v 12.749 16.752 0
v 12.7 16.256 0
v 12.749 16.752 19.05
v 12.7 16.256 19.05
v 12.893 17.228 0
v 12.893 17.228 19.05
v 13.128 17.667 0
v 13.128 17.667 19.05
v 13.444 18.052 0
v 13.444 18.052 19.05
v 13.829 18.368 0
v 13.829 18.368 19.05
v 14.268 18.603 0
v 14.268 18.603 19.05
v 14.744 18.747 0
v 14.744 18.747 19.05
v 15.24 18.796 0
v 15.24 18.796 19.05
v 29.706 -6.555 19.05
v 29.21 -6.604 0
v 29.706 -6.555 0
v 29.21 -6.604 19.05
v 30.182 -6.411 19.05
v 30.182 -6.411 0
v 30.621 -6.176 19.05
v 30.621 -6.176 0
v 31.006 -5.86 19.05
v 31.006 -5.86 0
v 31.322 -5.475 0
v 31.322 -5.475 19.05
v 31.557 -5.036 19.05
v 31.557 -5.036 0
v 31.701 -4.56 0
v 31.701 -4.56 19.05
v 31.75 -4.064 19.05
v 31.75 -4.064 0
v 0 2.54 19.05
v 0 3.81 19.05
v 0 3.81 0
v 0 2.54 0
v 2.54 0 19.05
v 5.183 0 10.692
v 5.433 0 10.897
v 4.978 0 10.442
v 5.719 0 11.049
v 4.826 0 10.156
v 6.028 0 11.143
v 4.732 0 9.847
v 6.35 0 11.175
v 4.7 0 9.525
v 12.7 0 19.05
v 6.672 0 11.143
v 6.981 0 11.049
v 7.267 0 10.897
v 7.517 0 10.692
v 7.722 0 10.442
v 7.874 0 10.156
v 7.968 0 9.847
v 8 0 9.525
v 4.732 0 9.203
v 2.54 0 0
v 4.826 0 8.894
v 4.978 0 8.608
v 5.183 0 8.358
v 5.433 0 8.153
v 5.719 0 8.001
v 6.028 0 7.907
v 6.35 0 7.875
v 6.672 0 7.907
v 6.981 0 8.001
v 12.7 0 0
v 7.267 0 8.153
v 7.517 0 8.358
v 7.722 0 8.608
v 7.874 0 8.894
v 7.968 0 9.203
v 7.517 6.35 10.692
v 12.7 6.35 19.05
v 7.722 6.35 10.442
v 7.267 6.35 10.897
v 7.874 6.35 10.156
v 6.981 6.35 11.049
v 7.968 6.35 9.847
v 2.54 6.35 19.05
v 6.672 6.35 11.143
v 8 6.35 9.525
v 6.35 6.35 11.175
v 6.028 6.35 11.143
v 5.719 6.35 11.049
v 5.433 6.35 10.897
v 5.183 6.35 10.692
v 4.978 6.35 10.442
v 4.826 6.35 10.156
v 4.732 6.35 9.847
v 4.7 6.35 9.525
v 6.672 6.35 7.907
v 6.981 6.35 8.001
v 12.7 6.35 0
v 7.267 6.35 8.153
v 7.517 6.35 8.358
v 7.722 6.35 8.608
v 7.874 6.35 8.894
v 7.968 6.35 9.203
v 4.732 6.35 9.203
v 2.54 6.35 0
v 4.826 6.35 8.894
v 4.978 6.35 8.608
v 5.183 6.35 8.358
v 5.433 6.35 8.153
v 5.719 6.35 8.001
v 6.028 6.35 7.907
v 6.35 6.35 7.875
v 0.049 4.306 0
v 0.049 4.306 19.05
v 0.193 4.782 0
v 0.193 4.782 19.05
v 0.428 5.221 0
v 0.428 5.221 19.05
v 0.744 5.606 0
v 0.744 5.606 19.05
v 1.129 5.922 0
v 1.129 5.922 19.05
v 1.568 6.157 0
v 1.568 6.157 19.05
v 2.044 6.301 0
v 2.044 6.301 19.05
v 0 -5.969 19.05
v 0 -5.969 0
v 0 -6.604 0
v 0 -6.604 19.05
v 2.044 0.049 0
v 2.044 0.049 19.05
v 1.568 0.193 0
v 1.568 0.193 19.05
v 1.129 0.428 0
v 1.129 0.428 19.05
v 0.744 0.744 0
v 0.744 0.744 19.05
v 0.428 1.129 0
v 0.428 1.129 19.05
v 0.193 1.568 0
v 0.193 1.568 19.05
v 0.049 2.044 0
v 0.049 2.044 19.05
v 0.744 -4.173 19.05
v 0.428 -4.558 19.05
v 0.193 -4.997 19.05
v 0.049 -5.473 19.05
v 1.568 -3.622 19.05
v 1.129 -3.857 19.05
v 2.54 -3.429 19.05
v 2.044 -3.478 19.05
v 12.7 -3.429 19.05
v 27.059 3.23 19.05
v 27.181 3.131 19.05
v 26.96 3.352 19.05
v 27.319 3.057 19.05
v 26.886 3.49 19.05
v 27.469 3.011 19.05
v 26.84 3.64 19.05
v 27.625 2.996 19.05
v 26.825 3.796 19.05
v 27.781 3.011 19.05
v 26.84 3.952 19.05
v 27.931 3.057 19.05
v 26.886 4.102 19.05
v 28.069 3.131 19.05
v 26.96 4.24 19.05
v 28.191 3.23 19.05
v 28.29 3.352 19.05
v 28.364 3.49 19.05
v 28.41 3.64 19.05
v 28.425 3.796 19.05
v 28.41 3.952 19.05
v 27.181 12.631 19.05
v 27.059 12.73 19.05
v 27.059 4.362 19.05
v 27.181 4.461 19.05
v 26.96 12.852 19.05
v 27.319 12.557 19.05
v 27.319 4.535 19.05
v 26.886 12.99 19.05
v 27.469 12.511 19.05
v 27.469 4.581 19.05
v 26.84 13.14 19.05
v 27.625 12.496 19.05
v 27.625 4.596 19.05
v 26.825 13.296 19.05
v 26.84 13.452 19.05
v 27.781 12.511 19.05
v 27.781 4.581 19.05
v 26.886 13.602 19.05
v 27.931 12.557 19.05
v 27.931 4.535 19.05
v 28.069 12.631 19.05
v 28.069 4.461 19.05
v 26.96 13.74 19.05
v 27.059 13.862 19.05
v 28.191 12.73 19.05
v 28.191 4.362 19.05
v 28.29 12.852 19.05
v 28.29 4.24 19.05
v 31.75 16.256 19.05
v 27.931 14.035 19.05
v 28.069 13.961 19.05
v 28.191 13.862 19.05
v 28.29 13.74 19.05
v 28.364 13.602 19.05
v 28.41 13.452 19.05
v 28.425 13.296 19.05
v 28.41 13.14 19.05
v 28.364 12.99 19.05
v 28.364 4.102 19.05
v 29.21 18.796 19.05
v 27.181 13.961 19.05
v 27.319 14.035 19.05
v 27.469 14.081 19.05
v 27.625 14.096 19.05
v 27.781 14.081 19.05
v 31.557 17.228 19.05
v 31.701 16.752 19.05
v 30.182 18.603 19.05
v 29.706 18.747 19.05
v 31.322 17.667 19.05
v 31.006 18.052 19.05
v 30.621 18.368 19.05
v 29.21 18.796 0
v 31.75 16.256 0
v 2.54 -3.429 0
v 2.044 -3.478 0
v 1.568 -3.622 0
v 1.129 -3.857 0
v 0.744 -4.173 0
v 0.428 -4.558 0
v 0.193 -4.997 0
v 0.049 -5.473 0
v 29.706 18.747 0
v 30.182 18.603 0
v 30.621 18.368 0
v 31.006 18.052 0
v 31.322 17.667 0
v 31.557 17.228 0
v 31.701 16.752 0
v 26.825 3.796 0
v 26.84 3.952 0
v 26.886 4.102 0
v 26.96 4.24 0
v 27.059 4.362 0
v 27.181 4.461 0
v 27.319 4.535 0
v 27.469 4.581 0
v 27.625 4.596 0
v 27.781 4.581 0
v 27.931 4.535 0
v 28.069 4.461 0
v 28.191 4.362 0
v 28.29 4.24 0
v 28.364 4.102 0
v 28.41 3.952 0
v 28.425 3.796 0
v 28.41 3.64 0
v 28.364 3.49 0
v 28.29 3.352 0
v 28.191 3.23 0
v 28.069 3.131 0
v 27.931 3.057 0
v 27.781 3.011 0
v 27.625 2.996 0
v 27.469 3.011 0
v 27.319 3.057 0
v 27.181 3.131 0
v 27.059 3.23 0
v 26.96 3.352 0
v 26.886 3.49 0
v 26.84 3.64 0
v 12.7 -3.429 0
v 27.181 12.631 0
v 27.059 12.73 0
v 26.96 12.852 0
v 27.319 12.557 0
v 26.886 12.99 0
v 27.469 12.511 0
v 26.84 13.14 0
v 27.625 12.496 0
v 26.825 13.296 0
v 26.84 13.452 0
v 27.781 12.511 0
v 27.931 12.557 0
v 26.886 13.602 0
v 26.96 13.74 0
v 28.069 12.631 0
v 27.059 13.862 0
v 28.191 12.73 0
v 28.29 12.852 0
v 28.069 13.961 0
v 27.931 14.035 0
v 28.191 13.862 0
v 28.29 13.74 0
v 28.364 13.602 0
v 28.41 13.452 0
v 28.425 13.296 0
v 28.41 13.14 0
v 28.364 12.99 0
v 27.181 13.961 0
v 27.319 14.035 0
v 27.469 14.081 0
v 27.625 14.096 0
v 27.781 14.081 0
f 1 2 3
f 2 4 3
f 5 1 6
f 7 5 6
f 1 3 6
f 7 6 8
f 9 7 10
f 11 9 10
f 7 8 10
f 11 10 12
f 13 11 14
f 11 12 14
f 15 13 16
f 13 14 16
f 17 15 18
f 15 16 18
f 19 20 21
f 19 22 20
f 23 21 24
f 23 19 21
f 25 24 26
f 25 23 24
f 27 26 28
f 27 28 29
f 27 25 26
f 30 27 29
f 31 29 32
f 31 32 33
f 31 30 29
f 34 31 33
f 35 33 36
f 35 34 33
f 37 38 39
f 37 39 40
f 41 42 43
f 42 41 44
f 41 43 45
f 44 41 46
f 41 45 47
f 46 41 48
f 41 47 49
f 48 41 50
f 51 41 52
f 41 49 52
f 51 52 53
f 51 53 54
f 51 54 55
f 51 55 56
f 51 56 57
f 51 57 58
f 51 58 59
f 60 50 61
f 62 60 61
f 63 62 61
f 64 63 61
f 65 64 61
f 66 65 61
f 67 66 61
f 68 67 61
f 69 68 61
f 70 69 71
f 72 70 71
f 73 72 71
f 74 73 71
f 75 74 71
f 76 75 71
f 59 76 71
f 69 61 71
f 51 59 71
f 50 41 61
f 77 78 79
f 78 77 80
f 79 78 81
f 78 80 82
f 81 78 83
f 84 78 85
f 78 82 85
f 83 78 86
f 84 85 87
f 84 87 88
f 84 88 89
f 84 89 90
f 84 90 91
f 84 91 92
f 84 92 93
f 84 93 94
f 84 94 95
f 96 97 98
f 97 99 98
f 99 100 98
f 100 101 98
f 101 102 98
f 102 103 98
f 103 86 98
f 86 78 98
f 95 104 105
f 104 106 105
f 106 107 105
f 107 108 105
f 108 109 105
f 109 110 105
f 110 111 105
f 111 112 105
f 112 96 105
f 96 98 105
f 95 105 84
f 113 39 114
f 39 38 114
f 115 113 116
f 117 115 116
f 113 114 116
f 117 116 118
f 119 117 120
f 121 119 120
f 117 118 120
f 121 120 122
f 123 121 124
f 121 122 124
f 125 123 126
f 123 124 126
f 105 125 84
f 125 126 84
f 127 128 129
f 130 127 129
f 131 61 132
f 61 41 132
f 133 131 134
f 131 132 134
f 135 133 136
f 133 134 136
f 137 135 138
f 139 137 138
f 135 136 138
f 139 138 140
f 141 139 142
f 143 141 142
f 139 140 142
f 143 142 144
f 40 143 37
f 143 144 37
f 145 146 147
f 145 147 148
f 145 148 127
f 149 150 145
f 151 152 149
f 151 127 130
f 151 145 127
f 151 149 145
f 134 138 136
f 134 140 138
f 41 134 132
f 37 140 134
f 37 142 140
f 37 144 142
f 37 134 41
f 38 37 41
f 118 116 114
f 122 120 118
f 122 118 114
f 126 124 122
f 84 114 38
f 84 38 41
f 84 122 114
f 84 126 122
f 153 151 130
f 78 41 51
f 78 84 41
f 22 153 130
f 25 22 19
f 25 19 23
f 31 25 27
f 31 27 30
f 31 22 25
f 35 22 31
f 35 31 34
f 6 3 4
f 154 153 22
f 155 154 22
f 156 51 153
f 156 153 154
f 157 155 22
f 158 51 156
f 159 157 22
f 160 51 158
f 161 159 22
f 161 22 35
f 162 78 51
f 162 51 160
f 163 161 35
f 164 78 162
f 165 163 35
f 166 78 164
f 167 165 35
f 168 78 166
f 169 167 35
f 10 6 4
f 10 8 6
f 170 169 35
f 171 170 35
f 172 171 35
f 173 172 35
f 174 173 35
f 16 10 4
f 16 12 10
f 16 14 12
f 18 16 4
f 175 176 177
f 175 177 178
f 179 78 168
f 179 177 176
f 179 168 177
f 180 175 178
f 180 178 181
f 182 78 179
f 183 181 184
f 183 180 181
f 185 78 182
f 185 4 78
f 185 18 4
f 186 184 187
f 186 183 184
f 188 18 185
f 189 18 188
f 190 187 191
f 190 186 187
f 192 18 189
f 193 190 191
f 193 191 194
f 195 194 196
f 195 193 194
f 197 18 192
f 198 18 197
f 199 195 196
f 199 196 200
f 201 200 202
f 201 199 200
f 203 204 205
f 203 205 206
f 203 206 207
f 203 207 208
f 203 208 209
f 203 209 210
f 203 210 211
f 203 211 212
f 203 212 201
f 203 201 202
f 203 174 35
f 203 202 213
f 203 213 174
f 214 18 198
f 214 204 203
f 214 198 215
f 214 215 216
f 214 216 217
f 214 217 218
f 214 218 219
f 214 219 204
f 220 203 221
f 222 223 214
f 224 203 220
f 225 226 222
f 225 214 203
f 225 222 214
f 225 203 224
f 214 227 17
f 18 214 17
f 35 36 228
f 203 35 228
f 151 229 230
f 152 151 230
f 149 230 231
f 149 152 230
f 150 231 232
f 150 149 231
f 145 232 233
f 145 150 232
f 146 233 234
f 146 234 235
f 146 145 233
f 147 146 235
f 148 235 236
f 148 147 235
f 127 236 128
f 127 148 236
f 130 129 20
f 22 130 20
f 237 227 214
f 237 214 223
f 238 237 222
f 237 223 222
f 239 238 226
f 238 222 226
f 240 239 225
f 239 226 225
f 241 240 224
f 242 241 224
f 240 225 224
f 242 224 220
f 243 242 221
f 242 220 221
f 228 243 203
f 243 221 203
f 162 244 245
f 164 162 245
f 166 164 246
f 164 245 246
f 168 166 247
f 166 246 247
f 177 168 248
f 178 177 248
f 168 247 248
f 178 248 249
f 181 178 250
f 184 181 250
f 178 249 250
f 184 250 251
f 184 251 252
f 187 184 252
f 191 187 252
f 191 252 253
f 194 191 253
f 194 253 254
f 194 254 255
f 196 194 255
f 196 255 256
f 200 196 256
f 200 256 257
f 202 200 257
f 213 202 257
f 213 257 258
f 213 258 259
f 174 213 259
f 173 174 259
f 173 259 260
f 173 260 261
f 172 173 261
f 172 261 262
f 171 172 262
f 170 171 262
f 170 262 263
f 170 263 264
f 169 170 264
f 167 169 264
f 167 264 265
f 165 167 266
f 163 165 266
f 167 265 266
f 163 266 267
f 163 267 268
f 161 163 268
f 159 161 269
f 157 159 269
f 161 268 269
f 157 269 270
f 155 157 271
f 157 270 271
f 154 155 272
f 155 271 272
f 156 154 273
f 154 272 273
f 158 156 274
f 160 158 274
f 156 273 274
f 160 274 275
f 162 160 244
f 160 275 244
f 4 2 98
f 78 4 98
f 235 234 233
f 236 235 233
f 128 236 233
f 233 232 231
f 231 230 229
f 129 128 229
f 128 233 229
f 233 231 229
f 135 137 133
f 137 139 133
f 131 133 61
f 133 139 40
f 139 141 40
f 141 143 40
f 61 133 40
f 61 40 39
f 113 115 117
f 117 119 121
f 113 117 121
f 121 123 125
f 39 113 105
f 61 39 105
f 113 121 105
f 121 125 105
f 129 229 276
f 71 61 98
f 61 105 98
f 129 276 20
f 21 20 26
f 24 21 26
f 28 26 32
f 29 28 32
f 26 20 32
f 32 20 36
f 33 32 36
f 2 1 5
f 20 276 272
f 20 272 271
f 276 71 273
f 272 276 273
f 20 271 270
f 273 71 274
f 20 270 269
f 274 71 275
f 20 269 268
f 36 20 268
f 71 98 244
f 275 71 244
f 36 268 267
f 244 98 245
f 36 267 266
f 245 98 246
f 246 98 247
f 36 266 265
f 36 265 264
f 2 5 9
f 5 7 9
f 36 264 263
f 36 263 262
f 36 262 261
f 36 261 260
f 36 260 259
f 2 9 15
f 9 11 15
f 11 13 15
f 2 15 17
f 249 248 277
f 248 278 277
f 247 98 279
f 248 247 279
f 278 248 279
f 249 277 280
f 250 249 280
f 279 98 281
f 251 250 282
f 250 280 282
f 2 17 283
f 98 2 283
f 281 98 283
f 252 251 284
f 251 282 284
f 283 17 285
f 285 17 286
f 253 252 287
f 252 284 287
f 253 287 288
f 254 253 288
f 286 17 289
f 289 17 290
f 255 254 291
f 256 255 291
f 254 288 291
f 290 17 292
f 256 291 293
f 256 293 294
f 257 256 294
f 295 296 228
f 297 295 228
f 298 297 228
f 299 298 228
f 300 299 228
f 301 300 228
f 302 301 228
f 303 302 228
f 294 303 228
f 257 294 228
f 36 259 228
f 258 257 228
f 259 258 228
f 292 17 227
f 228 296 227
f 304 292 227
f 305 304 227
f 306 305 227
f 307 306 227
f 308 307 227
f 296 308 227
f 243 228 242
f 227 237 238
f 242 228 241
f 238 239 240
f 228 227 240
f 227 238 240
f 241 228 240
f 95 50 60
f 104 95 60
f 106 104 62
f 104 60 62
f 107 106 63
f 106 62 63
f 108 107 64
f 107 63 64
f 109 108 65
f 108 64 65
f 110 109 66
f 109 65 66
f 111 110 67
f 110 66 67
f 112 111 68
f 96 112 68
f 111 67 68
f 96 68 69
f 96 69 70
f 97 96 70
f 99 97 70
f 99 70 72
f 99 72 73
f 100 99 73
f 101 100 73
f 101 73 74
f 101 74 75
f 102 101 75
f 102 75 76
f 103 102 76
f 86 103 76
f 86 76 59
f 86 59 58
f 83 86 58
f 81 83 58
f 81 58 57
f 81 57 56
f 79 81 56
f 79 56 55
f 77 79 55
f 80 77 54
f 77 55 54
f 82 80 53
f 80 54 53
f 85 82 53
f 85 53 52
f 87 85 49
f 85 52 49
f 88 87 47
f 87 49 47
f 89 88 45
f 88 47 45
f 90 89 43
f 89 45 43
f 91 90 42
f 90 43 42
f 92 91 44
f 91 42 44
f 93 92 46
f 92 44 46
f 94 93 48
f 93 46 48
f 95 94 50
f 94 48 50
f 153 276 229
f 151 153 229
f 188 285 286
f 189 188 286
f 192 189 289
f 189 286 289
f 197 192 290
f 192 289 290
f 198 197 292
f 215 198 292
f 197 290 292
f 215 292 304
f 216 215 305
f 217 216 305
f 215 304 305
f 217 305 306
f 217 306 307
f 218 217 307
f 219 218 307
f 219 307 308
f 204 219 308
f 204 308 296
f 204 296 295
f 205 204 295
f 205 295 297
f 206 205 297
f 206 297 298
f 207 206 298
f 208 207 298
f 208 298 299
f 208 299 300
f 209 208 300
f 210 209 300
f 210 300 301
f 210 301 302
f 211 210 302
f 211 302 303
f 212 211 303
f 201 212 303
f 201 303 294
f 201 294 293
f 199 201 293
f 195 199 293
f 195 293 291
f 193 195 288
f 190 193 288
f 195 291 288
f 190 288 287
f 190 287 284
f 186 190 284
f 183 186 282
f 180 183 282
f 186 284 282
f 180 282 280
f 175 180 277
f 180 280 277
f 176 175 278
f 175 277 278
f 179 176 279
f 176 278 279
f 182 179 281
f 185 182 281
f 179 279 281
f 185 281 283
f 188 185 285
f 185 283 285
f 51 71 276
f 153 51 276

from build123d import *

# Parameters (mm, degrees)
BOSS_EXTRUDE1_DEPTH       = 19.05
M4X0_7_TAPPED_HOLE1_D     = 3.3
M4X0_7_TAPPED_HOLE1_DEPTH = 6.35
M2X0_4_TAPPED_HOLE1_D     = 1.6
M2X0_4_TAPPED_HOLE1_DEPTH = 19.05
FILLET1_R                 = 2.54


with BuildPart() as part:
    # Sketch1 → Boss-Extrude1 (new body)
    with BuildSketch(Plane.XY):
        Polygon((0, 0), (12.7, 0), (12.7, -3.429), (0, -3.429), (0, -6.604), (31.75, -6.604), (31.75, 18.796), (12.7, 18.796), (12.7, 6.35), (0, 6.35), align=None)
    extrude(amount=BOSS_EXTRUDE1_DEPTH)

    # M4x0.7 Tapped Hole1
    with Locations(Plane(origin=(0, 6.35, 0), x_dir=(1, 0, 0), z_dir=(0, 1, 0))):
        with Locations((6.35, -9.525)):
            Hole(M4X0_7_TAPPED_HOLE1_D / 2, depth=M4X0_7_TAPPED_HOLE1_DEPTH)

    # M2x0.4 Tapped Hole1
    with Locations(Plane.XY.offset(19.05)):
        with Locations((27.625, 13.296), (27.625, 3.796)):
            Hole(M2X0_4_TAPPED_HOLE1_D / 2, depth=M2X0_4_TAPPED_HOLE1_DEPTH)

    # Fillet1
    fillet1_edges = [part.edges().sort_by_distance(p)[0] for p in [
        (0, 6.35, 9.525),
        (12.7, 18.796, 9.525),
        (31.75, 18.796, 9.525),
        (31.75, -6.604, 9.525),
        (0, -3.429, 9.525),
        (0, 0, 9.525),
    ]]
    fillet(fillet1_edges, radius=FILLET1_R)


solid = part.part
